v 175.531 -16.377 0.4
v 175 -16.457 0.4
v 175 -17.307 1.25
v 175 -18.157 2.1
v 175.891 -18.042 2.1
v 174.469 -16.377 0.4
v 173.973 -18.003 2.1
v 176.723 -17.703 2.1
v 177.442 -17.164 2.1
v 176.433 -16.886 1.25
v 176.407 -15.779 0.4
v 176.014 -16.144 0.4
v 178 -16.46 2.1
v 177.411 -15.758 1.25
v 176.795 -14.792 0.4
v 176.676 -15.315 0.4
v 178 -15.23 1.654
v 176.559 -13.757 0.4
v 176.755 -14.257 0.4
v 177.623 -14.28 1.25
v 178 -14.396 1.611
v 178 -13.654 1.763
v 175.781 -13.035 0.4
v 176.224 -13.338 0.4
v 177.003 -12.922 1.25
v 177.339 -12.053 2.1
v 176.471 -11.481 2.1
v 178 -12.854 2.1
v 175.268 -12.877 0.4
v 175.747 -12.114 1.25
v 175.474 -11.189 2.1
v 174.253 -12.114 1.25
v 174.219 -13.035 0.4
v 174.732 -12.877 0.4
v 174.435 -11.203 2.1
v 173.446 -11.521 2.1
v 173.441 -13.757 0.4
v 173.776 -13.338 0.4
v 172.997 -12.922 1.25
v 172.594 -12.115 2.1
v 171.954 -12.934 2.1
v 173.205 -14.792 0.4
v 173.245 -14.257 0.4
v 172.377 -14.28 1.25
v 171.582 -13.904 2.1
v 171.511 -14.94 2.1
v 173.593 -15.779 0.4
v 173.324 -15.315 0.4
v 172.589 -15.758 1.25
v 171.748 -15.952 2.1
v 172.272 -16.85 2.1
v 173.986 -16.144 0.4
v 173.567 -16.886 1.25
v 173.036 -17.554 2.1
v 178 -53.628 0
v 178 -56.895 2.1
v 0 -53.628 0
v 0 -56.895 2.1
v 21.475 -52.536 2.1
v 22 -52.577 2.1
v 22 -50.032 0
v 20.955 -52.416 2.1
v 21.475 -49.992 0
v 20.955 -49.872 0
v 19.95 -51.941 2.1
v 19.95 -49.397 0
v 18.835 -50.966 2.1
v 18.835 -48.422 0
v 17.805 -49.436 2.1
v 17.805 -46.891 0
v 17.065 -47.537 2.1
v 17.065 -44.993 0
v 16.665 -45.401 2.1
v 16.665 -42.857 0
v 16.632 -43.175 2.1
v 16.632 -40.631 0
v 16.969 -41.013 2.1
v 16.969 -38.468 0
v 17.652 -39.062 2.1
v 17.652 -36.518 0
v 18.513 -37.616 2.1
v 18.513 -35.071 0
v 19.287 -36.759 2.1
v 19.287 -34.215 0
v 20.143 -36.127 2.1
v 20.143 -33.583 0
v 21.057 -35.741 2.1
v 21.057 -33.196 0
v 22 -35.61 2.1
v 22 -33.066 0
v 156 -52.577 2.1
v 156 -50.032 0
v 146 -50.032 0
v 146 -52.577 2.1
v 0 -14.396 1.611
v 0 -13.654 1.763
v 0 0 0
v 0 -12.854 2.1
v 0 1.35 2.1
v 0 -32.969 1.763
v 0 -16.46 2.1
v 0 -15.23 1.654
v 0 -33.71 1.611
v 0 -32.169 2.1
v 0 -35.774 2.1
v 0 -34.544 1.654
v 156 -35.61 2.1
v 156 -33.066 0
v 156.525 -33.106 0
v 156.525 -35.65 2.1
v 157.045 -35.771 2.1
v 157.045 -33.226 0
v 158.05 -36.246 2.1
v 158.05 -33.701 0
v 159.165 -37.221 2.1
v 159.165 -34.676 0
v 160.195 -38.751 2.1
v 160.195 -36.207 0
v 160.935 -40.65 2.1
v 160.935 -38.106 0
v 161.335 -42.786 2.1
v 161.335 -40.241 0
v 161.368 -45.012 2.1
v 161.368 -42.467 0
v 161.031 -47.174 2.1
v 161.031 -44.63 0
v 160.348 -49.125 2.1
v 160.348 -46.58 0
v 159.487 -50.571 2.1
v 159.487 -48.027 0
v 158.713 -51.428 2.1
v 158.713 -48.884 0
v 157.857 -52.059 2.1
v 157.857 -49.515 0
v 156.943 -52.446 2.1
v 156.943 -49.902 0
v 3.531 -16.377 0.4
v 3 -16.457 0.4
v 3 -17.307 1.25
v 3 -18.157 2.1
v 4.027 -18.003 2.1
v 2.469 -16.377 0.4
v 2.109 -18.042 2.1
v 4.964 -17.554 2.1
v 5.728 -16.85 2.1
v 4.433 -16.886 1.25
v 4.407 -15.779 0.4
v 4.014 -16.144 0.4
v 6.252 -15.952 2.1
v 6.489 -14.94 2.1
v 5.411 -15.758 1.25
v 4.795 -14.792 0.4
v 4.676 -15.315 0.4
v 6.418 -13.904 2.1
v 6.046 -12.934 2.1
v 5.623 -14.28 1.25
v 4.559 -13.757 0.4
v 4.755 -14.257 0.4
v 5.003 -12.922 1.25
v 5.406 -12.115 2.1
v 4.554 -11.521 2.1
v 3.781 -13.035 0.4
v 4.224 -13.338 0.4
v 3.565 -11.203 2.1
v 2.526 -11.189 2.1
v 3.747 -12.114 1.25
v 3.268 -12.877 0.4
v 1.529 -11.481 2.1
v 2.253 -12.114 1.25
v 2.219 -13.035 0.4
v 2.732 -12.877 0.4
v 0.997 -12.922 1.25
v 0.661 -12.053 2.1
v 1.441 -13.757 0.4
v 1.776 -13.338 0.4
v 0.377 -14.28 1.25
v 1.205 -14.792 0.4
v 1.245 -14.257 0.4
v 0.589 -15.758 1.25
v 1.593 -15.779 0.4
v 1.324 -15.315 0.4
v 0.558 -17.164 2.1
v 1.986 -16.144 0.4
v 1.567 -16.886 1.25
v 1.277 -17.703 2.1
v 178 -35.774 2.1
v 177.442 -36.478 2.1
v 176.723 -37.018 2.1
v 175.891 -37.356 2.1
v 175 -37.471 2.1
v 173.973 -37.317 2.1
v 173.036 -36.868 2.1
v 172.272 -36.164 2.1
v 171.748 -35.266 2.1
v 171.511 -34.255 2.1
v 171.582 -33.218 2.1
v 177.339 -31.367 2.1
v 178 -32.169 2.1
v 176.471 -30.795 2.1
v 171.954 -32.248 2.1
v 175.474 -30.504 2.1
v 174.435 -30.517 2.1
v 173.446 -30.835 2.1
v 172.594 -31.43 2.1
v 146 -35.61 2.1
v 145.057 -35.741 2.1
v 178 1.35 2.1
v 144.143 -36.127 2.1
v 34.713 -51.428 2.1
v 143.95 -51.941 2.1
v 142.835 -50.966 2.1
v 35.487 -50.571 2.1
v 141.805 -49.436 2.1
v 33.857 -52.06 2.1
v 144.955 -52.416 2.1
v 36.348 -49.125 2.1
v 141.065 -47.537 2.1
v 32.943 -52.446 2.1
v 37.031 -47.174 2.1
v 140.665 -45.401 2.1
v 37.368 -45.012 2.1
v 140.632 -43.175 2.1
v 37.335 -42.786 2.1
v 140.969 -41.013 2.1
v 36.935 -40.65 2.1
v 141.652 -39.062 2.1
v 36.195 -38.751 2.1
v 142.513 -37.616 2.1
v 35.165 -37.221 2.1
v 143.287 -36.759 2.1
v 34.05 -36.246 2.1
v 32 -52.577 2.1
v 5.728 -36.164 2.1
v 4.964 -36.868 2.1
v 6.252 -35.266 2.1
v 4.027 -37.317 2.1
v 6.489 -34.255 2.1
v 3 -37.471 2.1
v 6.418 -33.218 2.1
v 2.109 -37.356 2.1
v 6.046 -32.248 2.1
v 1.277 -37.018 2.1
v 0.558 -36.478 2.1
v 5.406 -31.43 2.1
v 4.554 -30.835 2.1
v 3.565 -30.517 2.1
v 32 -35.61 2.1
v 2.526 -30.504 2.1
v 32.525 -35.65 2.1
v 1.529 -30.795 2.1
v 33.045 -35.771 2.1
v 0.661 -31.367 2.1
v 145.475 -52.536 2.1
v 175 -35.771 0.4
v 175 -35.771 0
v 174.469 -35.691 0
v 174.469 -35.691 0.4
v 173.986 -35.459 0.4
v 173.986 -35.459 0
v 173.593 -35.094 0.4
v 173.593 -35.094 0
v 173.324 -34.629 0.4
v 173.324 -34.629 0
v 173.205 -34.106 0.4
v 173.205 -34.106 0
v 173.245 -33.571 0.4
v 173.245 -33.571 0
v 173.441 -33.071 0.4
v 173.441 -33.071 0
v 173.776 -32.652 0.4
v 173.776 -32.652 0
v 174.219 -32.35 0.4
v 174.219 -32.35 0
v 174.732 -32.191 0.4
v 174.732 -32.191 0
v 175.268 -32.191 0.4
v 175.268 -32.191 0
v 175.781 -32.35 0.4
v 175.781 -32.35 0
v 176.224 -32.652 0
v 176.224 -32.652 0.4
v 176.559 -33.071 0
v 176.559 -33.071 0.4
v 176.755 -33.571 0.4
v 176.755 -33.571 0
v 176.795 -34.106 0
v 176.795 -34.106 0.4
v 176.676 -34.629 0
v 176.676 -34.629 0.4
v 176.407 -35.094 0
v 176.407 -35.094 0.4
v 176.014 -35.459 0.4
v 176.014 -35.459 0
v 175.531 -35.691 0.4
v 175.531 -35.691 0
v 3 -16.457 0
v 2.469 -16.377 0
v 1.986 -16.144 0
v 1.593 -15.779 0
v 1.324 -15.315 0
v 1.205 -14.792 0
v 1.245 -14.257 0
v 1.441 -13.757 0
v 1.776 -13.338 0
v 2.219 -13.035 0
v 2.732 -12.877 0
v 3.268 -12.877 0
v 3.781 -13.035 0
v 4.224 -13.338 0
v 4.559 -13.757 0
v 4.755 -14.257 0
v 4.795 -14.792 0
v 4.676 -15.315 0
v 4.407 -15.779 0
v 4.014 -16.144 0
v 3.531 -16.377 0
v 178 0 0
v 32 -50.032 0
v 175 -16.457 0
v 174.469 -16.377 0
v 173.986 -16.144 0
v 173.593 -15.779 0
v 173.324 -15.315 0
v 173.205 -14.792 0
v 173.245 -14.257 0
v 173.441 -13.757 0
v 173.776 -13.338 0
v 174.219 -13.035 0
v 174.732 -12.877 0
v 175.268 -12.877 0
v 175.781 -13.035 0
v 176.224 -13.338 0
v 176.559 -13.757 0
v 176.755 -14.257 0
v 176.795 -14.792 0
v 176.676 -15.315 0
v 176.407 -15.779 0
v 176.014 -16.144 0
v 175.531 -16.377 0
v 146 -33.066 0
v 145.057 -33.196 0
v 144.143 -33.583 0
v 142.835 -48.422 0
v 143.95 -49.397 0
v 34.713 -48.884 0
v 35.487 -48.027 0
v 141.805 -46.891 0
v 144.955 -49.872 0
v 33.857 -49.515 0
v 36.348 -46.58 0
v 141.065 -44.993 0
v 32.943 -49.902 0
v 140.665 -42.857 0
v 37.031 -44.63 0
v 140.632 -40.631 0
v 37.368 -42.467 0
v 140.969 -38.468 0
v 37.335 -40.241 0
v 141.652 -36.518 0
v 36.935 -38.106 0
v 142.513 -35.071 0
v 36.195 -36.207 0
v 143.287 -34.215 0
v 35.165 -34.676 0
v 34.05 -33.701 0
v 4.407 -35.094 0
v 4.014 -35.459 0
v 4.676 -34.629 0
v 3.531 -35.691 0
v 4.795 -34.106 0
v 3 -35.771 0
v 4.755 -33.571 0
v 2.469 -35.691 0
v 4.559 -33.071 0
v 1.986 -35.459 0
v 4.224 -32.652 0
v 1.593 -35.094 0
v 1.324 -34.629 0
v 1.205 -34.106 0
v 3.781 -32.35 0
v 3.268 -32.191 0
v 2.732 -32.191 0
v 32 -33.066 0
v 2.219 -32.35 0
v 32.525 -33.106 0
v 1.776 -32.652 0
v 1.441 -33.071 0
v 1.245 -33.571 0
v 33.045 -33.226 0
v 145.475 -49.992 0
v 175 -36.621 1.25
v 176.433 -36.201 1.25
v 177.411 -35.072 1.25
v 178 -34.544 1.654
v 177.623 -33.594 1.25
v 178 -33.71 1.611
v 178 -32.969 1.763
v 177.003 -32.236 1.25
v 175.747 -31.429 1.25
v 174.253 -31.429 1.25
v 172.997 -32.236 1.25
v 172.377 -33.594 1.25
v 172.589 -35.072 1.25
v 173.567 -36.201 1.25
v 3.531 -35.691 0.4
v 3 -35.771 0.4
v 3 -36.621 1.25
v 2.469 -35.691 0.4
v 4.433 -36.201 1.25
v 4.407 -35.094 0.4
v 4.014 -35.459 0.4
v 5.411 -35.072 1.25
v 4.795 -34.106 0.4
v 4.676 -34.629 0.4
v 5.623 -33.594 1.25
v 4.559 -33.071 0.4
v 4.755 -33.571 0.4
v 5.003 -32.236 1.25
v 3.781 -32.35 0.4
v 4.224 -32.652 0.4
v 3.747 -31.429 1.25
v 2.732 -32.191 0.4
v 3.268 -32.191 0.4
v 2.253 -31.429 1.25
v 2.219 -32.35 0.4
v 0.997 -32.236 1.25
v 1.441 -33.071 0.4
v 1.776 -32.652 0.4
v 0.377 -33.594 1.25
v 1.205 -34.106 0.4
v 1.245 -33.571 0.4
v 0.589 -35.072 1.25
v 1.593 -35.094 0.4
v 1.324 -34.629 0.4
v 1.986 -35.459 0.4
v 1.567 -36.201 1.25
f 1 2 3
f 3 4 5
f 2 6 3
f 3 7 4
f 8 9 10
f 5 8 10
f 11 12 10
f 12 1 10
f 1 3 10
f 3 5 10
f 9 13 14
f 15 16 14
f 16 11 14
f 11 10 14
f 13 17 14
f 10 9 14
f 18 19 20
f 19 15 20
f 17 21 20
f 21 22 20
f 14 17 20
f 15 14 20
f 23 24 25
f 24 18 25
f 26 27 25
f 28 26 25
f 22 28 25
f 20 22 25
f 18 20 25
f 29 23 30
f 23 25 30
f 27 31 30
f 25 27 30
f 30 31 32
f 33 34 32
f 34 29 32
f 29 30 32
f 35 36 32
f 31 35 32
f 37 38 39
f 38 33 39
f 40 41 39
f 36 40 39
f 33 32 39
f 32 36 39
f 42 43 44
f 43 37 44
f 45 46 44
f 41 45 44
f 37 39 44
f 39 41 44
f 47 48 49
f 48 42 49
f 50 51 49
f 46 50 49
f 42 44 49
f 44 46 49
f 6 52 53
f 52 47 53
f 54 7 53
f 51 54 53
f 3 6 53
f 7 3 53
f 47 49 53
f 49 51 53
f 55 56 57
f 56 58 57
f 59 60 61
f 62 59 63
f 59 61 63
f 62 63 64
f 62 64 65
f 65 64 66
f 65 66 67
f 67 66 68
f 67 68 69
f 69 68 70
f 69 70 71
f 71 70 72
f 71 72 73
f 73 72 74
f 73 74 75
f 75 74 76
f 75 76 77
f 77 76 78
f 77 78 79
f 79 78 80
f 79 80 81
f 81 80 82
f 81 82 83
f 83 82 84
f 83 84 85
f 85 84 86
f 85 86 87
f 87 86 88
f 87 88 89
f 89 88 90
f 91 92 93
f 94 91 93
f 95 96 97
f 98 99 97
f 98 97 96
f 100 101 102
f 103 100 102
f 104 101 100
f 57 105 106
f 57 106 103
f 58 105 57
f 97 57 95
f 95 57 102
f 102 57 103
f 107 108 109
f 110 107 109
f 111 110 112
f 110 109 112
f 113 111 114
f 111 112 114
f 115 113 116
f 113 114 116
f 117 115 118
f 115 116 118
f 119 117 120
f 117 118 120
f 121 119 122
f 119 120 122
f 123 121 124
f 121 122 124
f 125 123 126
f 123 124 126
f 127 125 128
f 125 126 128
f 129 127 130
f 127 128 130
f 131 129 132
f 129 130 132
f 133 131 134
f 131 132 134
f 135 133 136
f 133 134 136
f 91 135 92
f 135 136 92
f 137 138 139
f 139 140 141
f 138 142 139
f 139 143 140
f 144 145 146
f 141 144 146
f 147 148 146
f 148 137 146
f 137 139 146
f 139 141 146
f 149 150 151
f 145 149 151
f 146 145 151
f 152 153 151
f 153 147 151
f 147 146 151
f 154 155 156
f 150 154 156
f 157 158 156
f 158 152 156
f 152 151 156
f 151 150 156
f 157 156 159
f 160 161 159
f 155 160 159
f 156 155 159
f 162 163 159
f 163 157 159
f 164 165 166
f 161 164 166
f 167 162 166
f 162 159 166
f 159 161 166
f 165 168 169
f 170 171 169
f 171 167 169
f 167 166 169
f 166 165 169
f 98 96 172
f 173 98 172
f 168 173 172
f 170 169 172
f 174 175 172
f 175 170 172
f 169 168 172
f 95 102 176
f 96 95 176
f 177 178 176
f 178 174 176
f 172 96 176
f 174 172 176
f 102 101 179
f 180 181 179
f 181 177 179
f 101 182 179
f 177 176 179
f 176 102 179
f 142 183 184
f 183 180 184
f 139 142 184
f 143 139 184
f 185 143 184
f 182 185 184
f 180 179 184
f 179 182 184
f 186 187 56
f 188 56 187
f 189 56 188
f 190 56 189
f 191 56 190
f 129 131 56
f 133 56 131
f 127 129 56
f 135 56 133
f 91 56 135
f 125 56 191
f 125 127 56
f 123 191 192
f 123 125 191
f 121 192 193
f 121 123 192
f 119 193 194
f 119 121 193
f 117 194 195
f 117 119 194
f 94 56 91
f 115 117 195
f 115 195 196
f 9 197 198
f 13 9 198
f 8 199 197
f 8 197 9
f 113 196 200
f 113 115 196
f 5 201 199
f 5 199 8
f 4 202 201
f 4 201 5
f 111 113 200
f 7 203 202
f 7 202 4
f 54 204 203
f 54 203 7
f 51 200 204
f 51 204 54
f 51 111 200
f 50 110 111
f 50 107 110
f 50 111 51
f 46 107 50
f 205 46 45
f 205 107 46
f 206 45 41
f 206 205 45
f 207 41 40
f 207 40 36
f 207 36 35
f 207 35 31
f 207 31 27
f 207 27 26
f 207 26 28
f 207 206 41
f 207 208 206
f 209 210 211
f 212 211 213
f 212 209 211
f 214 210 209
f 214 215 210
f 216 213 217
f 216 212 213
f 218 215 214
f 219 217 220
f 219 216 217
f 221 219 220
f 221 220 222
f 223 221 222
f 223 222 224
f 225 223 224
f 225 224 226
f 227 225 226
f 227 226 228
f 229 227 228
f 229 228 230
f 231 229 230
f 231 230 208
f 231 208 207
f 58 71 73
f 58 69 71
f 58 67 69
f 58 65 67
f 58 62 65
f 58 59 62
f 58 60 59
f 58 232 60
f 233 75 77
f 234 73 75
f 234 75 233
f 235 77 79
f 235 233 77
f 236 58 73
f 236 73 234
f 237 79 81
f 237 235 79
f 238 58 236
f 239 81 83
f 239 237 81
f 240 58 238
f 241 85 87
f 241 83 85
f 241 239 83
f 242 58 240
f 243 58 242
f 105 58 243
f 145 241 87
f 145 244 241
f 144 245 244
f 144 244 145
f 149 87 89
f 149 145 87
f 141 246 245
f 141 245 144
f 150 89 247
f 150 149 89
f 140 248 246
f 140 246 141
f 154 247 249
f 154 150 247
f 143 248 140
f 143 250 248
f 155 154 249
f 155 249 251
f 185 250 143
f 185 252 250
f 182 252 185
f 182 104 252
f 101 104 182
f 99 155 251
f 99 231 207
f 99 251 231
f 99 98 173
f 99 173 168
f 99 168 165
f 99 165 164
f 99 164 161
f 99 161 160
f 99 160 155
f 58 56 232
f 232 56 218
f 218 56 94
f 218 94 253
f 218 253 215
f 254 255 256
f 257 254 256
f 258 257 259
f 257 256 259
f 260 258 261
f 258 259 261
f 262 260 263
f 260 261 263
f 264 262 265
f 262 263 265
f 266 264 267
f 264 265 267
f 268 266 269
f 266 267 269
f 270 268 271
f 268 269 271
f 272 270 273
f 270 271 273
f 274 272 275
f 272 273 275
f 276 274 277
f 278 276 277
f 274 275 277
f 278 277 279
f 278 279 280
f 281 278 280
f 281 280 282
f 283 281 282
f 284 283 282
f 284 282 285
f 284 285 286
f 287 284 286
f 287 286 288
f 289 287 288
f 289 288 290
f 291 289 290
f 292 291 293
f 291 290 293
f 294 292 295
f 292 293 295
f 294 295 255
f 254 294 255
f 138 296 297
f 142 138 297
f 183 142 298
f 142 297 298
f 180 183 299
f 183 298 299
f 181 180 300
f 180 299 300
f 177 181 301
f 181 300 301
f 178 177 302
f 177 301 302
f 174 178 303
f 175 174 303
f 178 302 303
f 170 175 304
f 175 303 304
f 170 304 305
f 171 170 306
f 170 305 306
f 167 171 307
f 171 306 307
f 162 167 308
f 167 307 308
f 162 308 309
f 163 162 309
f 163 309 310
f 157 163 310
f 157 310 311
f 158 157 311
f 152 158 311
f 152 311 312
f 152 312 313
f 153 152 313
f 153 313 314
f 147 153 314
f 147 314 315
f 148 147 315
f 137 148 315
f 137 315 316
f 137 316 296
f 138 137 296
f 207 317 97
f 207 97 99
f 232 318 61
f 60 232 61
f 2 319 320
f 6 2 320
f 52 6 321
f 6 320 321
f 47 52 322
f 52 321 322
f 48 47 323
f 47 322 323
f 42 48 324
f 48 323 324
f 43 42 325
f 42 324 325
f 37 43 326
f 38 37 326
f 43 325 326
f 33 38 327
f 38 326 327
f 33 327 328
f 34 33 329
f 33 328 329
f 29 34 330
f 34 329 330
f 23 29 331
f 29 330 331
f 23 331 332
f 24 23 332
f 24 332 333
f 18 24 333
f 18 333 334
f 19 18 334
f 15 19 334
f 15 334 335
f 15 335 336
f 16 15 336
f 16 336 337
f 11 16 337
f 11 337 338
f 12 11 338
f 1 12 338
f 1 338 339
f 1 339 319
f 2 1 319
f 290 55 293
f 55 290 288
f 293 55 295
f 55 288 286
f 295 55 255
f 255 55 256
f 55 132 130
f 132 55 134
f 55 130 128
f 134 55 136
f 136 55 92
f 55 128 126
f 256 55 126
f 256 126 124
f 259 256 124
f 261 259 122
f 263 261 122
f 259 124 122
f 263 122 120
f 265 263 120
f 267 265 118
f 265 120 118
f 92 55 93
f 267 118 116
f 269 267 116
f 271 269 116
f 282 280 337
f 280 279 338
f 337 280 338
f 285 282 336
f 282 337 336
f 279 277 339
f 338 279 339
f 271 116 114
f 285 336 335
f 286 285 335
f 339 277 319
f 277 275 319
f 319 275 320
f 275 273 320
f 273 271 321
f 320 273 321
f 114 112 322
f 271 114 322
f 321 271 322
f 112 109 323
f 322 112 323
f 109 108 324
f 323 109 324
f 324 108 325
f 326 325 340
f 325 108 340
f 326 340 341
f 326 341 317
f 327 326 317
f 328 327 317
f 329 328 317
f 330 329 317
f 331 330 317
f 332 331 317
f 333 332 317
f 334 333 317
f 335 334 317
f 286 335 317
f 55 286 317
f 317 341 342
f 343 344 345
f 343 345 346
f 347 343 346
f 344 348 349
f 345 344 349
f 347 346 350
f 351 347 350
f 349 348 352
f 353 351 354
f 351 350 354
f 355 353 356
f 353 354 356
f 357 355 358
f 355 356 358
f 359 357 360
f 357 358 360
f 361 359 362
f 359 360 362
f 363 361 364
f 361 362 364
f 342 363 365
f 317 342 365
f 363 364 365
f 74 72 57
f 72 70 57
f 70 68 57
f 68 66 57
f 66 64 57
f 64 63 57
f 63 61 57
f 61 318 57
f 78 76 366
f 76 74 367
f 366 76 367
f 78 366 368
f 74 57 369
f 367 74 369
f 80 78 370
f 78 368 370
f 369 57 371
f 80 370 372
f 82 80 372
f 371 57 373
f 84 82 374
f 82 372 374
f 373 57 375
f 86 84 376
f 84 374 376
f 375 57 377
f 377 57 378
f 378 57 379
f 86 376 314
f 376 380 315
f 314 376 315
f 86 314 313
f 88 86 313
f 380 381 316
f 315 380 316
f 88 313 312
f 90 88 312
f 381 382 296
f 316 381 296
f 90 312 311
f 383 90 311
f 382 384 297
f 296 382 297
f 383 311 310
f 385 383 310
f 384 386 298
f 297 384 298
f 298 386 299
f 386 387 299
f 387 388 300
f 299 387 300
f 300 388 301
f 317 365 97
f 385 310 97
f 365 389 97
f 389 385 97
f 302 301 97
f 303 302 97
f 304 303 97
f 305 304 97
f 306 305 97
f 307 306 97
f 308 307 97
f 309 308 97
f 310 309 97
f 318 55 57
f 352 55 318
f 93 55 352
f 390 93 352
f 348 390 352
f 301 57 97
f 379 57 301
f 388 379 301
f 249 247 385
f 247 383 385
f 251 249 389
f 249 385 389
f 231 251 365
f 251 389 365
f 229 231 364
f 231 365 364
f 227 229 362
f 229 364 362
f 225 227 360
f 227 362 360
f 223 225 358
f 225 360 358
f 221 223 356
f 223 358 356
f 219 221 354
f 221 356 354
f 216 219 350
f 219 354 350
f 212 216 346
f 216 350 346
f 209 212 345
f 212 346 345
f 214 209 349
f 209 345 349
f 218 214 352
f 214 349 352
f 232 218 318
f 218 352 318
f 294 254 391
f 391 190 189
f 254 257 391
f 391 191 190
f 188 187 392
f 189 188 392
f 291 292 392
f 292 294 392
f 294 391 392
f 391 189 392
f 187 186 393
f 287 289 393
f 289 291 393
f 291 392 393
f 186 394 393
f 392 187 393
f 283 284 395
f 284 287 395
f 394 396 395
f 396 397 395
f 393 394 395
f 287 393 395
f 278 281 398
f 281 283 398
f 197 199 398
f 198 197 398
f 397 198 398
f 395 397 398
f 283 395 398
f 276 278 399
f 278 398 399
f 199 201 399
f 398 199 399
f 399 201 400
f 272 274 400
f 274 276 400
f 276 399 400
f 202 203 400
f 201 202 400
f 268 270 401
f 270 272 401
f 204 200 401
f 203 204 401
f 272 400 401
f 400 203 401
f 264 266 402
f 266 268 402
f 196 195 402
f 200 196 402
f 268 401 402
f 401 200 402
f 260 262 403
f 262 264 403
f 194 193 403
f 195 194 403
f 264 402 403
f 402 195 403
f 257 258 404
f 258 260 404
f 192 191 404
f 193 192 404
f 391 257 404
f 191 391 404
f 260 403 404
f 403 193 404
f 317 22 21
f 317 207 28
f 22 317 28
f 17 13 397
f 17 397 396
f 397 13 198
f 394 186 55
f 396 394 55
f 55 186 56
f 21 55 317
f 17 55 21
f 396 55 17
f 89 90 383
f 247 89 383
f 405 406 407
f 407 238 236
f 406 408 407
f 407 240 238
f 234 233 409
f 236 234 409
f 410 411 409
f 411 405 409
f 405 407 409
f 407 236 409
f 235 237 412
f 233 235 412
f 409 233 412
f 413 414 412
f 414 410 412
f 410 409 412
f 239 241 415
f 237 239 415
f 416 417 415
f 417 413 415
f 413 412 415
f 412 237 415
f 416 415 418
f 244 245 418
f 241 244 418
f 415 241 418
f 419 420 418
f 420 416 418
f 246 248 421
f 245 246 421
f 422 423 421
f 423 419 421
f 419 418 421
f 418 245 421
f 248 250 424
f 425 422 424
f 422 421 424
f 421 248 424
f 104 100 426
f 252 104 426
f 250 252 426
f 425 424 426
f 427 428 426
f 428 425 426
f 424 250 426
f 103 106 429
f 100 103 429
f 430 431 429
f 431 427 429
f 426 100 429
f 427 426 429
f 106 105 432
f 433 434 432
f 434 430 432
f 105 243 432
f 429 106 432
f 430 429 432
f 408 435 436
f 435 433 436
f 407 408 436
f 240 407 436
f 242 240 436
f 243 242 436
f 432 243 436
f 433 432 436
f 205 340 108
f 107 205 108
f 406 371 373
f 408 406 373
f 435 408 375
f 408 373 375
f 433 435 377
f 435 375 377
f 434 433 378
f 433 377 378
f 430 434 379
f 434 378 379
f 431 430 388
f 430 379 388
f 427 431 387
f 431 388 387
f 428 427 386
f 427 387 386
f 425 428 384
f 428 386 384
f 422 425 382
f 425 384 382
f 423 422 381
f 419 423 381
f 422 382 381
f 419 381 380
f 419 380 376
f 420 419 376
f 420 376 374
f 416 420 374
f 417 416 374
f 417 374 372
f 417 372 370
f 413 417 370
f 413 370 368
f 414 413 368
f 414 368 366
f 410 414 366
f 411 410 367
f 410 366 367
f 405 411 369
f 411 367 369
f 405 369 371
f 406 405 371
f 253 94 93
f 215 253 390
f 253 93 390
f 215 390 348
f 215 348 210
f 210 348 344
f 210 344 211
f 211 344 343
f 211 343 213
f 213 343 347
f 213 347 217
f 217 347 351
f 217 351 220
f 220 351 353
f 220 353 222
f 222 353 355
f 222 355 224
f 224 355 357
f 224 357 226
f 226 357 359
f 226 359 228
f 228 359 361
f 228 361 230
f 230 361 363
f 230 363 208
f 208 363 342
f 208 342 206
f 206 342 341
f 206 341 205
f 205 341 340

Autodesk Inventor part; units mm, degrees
ref_plane "YZ Plane" through (0, 0, 0) normal (1, 0, 0) x (0, 1, 0)
ref_plane "XZ Plane" through (0, 0, 0) normal (0, 1, 0) x (-1, 0, 0)
ref_plane "Work Plane1" through (0, 4.7283, -22.9522) normal (-1, 0, 0) x (0, -0.8411785, 0.5407576)
sketch "Sketch1" plane through (0, 4.7283, -22.9522) normal (-1, 0, 0) x (0, -0.8411785, 0.5407576)
  line L0 (-34.301, -16.75) -> (61.5, -16.75) projected
  line L1 (61.5, -16.75) -> (61.5, -12.25) projected
  line L2 (61.5, -12.25) -> (16.3889, 16.75) projected
  line L3 (16.3889, 16.75) -> (-61.5, 16.75) projected
  line L4 (-61.5, 16.75) -> (-61.5, -12.801) projected
  line L5 (61.5, -12.25) -> (61.5, -16.75) projected
  line L6 (61.5, -16.75) -> (65.5, -16.75) projected
  line L7 (65.5, -16.75) -> (65.5, -20.25) projected
  line L8 (65.5, -20.25) -> (79.5, -20.25) projected
  line L9 (79.5, -20.25) -> (65.5, -11.25) projected
  line L10 (65.5, -11.25) -> (65.5, -12.25) projected
  line L11 (65.5, -12.25) -> (61.5, -12.25) projected
  line L12 (16.3889, 16.75) -> (16.3889, 18.75) projected
  line L13 (14.3494, 18.75) -> (16.3889, 18.75) projected
  line L14 (65.3834, -12.25) -> (12.6747, 21.6342)
  line L15 (16.3889, 16.75) -> (16.3889, 19.2465)
  arc A0 (-57.551, -16.75) -> (-61.5, -12.801) centre (-58.75, -14) ccw projected
  line L16 (-57.551, -16.75) -> (-36.699, -16.75) projected
  arc A1 (-34.301, -16.75) -> (-36.699, -16.75) centre (-35.5, -14) ccw projected
  dimension "d13" = 2.1
ref_plane "Work Plane2" through (178, -56.0619, -70.2985) normal (1, 0, 0) x (0, 0.8411785, -0.5407576)
extrude "Extrusion1" add sketch "Sketch1" against normal up to surface (178 mm away) contours L2 L12 L15 L14 L11
sketch "Sketch2" plane through (0, -56.8951, 2.1) normal (0, 0, 1) x (1, 0, 0)
  circle A0 centre (3, 22.9238) radius 2.5 projected
  circle A1 centre (3, 42.238) radius 2.5 projected
  line L0 (0, 3.2667) -> (0, 56.8951) projected
  line L1 (0, 3.2667) -> (6, 3.2667) projected
  line L2 (6, 56.8951) -> (6, 3.2667) projected
  line L3 (0, 56.8951) -> (6, 56.8951) projected
  circle A2 centre (175, 22.9238) radius 2.5 projected
  circle A3 centre (175, 42.238) radius 2.5 projected
  line L4 (178, 3.2667) -> (178, 56.8951) projected
  line L5 (178, 56.8951) -> (172, 56.8951) projected
  line L6 (172, 56.8951) -> (172, 3.2667) projected
  line L7 (178, 3.2667) -> (172, 3.2667) projected
hole "Hole1" at (3, -14.6571, 2.1) at (3, -33.9713, 2.1) at (175, -33.9713, 2.1) at (175, -14.6571, 2.1) direction (0, 0, -1) diameter 3.6 end through all countersink diameter 7 countersink angle 90 clearance for "Countersunk Flat Head Screw ISO 2009/7046" size "M3" standard "ISO"
ref_plane "Work Plane3" through (22, -30.5397, -9.0869) normal (0, -0.7712334, 0.6365525) x (1, 0, 0)
sketch "Sketch3" plane through (22, -30.5397, -9.0869) normal (0, -0.7712334, 0.6365525) x (1, 0, 0)
  line L0 (-9.9215, 5.4518) -> (-9.9215, -5.4534)
  spline S0 degree 3 poles (-9.9215, -5.4534) (-9.9222, -5.5772) (-9.8204, -5.8209) (-9.5772, -5.9222) (-9.4534, -5.9215) knots 0 0 0 0 0.5 1 1 1 1
  line L1 (-9.4534, -5.9215) -> (19.4534, -5.9215)
  spline S1 degree 3 poles (19.4534, -5.9215) (19.5775, -5.9222) (19.8219, -5.82) (19.9222, -5.5758) (19.9215, -5.4518) knots 0 0 0 0 0.5 1 1 1 1
  line L2 (19.9215, -5.4518) -> (19.9215, 5.4534)
  spline S2 degree 3 poles (19.9215, 5.4534) (19.9222, 5.5775) (19.82, 5.8219) (19.5758, 5.9222) (19.4518, 5.9215) knots 0 0 0 0 0.5 1 1 1 1
  line L3 (19.4518, 5.9215) -> (-9.4534, 5.9215)
  spline S3 degree 3 poles (-9.4534, 5.9215) (-9.5775, 5.9222) (-9.8219, 5.82) (-9.9222, 5.5758) (-9.9215, 5.4518) knots 0 0 0 0 0.5 1 1 1 1
  circle A0 centre (-8.3791, -4.3791) radius 0.5
  circle A1 centre (-8.3791, 4.3791) radius 0.5
  circle A2 centre (18.3791, 4.3791) radius 0.5
  circle A3 centre (18.3791, -4.3791) radius 0.5
  arc A4 (5.2617, -1.4512) -> (5.1811, -1.5218) centre (5.2771, -1.55) ccw
  arc A5 (5.1811, 1.5218) -> (5.1811, -1.5218) centre (0, 0) ccw
  arc A6 (5.1811, 1.5218) -> (5.2617, 1.4512) centre (5.2771, 1.55) ccw
  arc A7 (5.2617, 1.4512) -> (5.3414, 1.519) centre (5.2463, 1.55) ccw
  arc A8 (5.3414, -1.519) -> (5.3414, 1.519) centre (10, 0) ccw
  arc A9 (5.3414, -1.519) -> (5.2617, -1.4512) centre (5.2463, -1.55) ccw
  line L4 (143.9215, 5.4518) -> (143.9215, -5.4534)
  spline S4 degree 3 poles (143.4534, 5.9215) (143.5775, 5.9222) (143.8219, 5.82) (143.9222, 5.5758) (143.9215, 5.4518) knots 0 0 0 0 0.5 1 1 1 1
  line L5 (114.5482, 5.9215) -> (143.4534, 5.9215)
  spline S5 degree 3 poles (114.0785, 5.4534) (114.0778, 5.5775) (114.18, 5.8219) (114.4242, 5.9222) (114.5482, 5.9215) knots 0 0 0 0 0.5 1 1 1 1
  line L6 (114.0785, -5.4518) -> (114.0785, 5.4534)
  spline S6 degree 3 poles (114.5466, -5.9215) (114.4225, -5.9222) (114.1781, -5.82) (114.0778, -5.5758) (114.0785, -5.4518) knots 0 0 0 0 0.5 1 1 1 1
  line L7 (143.4534, -5.9215) -> (114.5466, -5.9215)
  spline S7 degree 3 poles (143.9215, -5.4534) (143.9222, -5.5772) (143.8204, -5.8209) (143.5772, -5.9222) (143.4534, -5.9215) knots 0 0 0 0 0.5 1 1 1 1
  circle A10 centre (142.3791, -4.3791) radius 0.5
  circle A11 centre (142.3791, 4.3791) radius 0.5
  circle A12 centre (115.6209, 4.3791) radius 0.5
  circle A13 centre (115.6209, -4.3791) radius 0.5
  arc A14 (128.8189, -1.5218) -> (128.7383, -1.4512) centre (128.7229, -1.55) ccw
  arc A15 (128.7383, -1.4512) -> (128.6586, -1.519) centre (128.7537, -1.55) ccw
  arc A16 (128.6586, 1.519) -> (128.6586, -1.519) centre (124, 0) ccw
  arc A17 (128.6586, 1.519) -> (128.7383, 1.4512) centre (128.7537, 1.55) ccw
  arc A18 (128.7383, 1.4512) -> (128.8189, 1.5218) centre (128.7229, 1.55) ccw
  arc A19 (128.8189, -1.5218) -> (128.8189, 1.5218) centre (134, 0) ccw
  circle A20 centre (10, 0) radius 5.4
  circle A21 centre (124, 0) radius 5.4
  line L8 (0, 5.4) -> (10, 5.4)
  line L9 (10, -5.4) -> (0, -5.4)
  line L10 (124, 5.4) -> (134, 5.4)
  line L11 (134, -5.4) -> (124, -5.4)
  point P0 (-22, 26.4483)
  dimension "d9" = 10.8
  dimension "d10" = 10.8
extrude "Extrusion2" cut sketch "Sketch3" along normal blind 78.25 contours A9 A8 A7 A6 A5 A20 A4 | A4 A5 A20 A6 A7 A8 A9 | A20 L9 A5 | A5 A20 | A5 L8 A20 | A19 A21 A18 A17 A16 A15 A14 | A14 A15 A16 A17 A18 A19 A21 | A21 A19 | A19 L11 A21 | A19 A21 L10
properties part number "front"
